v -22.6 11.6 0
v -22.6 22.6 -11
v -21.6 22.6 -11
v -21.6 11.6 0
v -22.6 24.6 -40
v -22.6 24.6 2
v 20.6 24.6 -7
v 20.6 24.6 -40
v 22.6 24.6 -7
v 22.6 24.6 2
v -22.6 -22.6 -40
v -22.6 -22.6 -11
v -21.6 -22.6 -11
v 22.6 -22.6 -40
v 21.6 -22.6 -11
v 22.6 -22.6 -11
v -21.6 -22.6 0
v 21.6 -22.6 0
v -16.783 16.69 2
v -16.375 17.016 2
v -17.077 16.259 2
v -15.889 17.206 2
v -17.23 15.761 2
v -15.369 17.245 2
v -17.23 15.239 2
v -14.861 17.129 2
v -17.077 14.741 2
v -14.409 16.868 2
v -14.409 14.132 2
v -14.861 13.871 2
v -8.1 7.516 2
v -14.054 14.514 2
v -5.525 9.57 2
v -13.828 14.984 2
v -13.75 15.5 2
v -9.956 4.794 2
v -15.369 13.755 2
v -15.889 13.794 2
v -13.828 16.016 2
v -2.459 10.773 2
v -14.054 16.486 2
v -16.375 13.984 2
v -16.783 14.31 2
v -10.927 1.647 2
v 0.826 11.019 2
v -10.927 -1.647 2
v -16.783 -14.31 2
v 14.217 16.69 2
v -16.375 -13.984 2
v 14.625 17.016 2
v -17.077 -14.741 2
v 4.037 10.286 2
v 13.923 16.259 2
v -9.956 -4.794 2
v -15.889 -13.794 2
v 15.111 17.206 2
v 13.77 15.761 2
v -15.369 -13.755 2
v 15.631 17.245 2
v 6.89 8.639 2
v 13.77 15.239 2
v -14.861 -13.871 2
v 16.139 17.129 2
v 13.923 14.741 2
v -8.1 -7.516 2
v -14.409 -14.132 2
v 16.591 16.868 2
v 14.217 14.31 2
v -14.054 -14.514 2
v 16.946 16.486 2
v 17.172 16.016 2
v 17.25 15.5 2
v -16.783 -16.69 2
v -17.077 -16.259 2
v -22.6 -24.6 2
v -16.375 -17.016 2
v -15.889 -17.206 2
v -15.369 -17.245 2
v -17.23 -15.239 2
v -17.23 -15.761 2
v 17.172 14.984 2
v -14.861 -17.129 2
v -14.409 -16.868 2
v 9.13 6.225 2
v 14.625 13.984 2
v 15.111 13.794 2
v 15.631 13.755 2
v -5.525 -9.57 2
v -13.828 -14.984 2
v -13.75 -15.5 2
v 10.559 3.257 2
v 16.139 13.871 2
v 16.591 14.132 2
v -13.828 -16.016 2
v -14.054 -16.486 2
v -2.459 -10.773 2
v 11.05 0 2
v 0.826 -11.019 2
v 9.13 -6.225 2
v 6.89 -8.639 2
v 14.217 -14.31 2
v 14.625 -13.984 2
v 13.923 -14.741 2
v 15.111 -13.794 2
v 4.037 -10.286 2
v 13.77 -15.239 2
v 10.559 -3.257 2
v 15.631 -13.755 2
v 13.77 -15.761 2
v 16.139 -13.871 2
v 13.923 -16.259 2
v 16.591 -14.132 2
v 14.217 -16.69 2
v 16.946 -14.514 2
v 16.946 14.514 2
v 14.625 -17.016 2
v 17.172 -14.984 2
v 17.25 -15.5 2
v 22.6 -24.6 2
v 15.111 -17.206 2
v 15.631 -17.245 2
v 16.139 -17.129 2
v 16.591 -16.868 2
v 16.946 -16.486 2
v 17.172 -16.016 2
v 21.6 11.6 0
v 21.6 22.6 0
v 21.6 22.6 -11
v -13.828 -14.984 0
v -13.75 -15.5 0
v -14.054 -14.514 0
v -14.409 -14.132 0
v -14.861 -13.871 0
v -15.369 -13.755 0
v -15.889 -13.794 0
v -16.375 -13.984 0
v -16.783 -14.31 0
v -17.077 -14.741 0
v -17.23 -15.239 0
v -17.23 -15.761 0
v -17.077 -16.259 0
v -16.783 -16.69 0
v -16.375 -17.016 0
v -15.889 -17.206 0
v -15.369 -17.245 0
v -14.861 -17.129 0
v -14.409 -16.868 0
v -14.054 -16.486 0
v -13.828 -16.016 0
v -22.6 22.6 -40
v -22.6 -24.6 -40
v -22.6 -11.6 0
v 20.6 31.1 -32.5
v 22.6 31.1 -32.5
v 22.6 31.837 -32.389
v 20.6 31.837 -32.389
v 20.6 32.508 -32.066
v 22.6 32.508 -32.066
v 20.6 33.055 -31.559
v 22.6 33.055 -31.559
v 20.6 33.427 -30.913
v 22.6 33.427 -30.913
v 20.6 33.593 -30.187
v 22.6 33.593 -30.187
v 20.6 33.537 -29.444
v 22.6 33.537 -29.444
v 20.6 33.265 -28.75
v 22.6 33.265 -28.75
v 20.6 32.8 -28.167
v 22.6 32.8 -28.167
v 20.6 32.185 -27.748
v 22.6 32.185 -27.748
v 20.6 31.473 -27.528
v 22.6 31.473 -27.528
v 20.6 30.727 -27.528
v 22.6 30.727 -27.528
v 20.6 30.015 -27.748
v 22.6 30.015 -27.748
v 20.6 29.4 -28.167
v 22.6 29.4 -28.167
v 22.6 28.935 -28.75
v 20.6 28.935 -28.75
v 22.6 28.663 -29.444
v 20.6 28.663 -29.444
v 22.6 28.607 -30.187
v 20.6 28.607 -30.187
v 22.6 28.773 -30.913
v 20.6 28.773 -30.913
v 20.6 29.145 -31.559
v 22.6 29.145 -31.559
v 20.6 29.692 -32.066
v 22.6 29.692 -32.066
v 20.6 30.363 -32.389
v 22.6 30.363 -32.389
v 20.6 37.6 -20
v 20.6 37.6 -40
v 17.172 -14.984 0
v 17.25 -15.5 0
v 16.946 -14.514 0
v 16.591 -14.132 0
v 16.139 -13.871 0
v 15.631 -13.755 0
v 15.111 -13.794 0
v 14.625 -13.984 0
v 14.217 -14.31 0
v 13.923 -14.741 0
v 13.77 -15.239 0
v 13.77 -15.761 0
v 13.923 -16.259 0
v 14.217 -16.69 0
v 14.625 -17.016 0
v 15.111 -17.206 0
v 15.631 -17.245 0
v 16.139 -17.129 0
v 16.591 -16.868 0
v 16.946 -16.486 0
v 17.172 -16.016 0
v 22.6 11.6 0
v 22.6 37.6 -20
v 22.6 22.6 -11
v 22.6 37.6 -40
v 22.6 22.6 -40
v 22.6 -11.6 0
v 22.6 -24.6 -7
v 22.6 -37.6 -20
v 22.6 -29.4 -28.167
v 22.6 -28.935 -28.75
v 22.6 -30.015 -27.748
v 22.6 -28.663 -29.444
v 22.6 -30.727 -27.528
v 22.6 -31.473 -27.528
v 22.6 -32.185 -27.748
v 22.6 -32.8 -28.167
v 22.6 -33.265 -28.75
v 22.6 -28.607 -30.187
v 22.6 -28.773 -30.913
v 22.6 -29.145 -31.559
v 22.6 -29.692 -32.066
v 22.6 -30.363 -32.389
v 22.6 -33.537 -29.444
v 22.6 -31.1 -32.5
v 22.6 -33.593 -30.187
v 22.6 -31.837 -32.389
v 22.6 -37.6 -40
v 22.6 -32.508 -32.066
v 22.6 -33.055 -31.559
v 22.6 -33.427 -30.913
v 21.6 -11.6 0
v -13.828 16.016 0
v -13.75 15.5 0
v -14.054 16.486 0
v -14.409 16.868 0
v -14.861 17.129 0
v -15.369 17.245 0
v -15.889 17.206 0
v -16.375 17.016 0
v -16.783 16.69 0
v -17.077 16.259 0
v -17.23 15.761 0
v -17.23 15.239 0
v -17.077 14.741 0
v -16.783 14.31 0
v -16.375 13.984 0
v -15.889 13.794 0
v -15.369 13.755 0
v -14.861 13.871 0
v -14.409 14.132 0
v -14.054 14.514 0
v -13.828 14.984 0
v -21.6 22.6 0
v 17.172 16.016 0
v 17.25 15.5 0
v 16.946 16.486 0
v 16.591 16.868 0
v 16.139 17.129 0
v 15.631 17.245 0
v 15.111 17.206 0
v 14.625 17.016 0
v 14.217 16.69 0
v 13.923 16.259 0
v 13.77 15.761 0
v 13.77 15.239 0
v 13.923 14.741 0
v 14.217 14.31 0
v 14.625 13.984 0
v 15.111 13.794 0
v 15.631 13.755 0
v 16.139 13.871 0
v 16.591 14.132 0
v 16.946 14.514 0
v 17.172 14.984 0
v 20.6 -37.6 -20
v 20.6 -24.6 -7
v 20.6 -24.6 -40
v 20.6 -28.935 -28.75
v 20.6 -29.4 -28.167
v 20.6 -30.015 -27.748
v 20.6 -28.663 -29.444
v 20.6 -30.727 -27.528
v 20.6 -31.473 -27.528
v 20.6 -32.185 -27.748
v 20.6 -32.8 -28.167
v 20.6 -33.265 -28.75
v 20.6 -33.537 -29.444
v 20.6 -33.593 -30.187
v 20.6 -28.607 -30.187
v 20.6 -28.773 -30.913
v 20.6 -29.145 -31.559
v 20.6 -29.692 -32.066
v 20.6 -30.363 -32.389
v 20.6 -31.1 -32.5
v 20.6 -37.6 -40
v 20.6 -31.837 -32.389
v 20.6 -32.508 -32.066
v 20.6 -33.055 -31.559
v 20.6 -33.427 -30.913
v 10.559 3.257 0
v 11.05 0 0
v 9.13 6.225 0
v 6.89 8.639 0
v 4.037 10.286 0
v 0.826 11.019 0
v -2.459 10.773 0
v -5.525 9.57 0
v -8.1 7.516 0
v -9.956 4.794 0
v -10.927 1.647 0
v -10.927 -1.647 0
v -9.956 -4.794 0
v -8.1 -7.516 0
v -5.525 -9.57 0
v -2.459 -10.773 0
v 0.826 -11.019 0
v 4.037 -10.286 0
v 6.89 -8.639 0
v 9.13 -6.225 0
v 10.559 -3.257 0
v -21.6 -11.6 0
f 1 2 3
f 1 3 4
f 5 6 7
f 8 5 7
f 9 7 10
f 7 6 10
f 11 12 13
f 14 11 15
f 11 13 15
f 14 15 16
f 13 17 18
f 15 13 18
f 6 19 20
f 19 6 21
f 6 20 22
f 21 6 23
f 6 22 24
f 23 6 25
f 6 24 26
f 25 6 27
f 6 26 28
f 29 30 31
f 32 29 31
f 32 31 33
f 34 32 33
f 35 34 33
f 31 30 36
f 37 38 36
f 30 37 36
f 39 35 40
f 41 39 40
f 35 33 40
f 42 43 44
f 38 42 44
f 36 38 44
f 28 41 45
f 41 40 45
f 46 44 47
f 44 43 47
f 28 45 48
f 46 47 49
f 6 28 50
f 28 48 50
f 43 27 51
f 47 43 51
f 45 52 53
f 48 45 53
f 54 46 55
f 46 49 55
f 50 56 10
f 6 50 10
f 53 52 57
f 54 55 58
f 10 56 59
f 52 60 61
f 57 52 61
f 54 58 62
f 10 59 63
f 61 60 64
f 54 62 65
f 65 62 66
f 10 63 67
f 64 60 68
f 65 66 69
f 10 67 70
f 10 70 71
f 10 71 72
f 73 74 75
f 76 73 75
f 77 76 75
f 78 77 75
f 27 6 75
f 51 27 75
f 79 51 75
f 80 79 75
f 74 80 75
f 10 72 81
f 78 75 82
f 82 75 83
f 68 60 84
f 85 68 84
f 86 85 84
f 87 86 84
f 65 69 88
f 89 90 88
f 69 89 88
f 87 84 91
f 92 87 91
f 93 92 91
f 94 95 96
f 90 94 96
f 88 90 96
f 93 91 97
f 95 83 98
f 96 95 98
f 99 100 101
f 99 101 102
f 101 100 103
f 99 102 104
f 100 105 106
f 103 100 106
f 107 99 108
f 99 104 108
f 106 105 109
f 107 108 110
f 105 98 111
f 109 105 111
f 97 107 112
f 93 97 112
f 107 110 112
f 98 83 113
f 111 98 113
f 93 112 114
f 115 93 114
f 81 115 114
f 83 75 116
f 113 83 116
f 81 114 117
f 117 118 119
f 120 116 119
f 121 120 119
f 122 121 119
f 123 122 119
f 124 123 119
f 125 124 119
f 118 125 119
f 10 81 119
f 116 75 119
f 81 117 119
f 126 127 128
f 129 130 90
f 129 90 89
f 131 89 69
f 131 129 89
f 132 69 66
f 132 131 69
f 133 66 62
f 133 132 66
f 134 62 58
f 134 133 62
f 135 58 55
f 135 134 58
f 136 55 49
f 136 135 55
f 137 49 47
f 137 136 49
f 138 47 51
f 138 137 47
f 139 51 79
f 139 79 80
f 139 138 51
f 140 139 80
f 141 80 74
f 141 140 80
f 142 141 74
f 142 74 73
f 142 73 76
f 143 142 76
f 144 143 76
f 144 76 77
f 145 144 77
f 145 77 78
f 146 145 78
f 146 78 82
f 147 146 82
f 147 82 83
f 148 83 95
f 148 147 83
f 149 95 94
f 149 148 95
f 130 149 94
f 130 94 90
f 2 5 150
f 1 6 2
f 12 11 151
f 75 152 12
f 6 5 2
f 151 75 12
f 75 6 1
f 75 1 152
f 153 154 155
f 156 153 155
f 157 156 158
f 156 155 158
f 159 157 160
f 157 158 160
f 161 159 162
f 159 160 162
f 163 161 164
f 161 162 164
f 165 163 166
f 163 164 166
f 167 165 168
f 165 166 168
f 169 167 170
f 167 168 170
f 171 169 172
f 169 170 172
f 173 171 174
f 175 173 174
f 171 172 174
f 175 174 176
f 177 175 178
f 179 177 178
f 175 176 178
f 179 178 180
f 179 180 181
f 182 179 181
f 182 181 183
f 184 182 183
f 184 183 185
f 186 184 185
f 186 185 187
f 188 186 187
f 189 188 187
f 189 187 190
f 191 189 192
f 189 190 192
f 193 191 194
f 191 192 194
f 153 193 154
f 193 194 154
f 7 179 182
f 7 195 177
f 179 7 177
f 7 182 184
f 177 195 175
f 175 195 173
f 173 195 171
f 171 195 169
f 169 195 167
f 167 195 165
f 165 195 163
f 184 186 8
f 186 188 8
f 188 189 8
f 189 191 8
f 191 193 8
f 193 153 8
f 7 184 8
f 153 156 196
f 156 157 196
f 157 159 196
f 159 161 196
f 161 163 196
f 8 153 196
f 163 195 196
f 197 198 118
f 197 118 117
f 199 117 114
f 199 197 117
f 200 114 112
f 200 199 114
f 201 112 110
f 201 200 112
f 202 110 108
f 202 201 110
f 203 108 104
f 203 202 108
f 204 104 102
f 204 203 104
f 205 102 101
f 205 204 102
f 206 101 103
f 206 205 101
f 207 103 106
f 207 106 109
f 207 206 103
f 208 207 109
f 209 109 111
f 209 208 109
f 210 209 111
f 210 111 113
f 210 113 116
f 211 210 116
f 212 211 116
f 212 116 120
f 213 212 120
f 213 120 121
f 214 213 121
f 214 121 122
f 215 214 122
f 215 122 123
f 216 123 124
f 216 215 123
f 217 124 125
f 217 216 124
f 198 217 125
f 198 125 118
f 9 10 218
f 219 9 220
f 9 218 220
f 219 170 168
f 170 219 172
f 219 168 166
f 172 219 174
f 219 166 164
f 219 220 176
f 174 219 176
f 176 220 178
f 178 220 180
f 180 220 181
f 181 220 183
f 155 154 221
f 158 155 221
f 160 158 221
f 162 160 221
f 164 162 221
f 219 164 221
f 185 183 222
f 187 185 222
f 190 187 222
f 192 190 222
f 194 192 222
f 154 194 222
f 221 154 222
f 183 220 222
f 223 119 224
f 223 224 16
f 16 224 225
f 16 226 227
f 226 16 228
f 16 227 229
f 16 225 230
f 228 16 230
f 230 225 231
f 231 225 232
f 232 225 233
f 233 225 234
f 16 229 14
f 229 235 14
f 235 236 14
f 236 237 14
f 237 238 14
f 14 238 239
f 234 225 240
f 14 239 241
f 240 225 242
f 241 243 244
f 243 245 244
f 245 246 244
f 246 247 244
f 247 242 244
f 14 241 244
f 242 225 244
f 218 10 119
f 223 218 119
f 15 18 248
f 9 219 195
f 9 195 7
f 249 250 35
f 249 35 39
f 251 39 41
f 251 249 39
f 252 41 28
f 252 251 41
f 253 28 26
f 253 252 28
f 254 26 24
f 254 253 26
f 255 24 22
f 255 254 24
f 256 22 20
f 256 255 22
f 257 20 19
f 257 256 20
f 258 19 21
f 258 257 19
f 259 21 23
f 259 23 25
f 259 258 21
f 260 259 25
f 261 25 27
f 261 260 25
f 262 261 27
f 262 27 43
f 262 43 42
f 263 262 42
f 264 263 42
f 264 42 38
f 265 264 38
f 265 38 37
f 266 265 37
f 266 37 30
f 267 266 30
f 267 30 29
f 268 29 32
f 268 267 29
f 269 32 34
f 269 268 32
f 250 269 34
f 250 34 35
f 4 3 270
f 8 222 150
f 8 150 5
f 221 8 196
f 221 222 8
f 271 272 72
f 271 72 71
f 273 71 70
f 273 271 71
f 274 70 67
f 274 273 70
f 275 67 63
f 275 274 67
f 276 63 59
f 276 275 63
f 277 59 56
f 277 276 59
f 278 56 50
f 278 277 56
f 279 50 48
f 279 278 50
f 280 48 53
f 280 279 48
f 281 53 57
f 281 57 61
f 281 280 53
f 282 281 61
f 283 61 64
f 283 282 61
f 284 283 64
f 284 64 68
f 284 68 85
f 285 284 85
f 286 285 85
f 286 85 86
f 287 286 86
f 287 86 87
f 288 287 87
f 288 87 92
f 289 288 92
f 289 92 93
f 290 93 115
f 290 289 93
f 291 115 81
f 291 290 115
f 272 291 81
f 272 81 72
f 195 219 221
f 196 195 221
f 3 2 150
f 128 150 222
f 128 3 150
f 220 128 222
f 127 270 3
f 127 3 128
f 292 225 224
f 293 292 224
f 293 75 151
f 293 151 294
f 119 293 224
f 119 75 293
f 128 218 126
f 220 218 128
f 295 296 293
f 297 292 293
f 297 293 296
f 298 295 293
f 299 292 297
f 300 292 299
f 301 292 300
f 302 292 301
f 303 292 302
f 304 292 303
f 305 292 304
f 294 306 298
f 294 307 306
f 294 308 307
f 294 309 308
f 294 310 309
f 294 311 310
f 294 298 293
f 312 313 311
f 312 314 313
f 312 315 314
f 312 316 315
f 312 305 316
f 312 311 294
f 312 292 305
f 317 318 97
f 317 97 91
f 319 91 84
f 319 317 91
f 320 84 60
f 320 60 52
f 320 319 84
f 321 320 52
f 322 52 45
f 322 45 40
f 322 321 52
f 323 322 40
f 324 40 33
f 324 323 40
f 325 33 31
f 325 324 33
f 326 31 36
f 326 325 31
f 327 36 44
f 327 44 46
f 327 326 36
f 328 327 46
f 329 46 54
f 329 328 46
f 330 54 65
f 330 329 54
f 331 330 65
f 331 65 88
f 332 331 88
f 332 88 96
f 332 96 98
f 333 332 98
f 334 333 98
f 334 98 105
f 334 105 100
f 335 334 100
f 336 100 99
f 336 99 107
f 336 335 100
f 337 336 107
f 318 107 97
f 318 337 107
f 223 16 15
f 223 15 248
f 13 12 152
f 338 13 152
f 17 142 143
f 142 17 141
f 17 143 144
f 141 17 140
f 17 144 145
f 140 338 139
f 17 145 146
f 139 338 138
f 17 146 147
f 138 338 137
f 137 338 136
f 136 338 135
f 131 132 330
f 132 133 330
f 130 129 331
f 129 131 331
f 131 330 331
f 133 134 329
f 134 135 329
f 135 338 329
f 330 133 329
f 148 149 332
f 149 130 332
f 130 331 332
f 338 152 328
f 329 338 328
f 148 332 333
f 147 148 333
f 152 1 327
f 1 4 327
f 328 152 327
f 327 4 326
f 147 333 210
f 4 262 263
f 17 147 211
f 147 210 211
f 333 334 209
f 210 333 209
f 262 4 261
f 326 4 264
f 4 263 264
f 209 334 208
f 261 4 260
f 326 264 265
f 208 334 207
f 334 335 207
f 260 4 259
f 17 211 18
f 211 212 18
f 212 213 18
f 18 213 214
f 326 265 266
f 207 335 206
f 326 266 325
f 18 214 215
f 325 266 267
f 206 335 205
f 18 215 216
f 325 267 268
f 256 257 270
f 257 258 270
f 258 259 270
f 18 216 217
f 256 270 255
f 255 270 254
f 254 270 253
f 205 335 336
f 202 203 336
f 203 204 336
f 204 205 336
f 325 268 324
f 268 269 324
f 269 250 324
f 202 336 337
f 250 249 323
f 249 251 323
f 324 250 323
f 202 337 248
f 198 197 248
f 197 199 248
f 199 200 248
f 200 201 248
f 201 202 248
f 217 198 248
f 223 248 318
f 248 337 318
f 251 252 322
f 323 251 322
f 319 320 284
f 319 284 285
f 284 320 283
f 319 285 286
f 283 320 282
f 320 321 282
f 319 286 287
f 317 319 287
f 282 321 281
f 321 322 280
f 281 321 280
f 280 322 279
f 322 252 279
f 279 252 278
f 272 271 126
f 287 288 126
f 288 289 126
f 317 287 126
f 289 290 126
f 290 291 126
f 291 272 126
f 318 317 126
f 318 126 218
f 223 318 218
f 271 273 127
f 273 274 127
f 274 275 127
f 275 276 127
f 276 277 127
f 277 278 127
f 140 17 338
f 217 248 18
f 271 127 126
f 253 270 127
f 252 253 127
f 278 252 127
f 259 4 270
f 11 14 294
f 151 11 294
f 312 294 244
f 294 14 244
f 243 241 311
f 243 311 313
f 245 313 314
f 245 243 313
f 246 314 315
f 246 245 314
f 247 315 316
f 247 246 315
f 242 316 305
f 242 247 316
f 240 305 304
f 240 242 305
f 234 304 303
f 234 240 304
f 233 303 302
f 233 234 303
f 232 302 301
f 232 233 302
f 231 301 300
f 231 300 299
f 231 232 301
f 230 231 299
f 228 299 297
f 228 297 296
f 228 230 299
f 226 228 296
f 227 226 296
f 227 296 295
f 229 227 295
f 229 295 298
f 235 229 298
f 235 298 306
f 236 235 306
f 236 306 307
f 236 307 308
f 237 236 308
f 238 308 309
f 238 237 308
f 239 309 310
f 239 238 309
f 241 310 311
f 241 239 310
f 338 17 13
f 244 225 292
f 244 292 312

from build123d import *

# Parameters (mm, degrees)
SKETCH1_W           = 45.2
SKETCH1_H           = 45.2
SKETCH1_R           = 1.75
SKETCH1_R_2         = 11.05
BOSS_EXTRUDE1_DEPTH = 2
SKETCH3_W           = 45.2
SKETCH3_H           = 2
BOSS_EXTRUDE2_DEPTH = 42
SKETCH4_W           = 20
SKETCH4_H           = 13
SKETCH4_R           = 2.5
BOSS_EXTRUDE3_DEPTH = 2
BOSS_EXTRUDE4_DEPTH = 1
BOSS_EXTRUDE5_DEPTH = 1


with BuildPart() as part:
    # Sketch1 → Boss-Extrude1 (new body)
    with BuildSketch(Plane.XY):
        Rectangle(SKETCH1_W, SKETCH1_H)
        with Locations((-15.5, 15.5)):
            Circle(SKETCH1_R, mode=Mode.SUBTRACT)
        with Locations((15.5, 15.5)):
            Circle(SKETCH1_R, mode=Mode.SUBTRACT)
        with Locations((-15.5, -15.5)):
            Circle(SKETCH1_R, mode=Mode.SUBTRACT)
        with Locations((15.5, -15.5)):
            Circle(SKETCH1_R, mode=Mode.SUBTRACT)
        Circle(SKETCH1_R_2, mode=Mode.SUBTRACT)
    extrude(amount=BOSS_EXTRUDE1_DEPTH)

    # Sketch3 → Boss-Extrude2 (add)
    with BuildSketch(Plane.XY.offset(2)):
        with Locations((0, 23.6)):
            Rectangle(SKETCH3_W, SKETCH3_H)
    boss_extrude2 = extrude(amount=-BOSS_EXTRUDE2_DEPTH)

    # Sketch4 → Boss-Extrude3 (add)
    with BuildSketch(Plane(origin=(22.6, 0, 0), x_dir=(0, 0, -1), z_dir=(1, 0, 0))):
        Polygon((7, 24.6), (20, 24.6), (20, 37.6), align=None)
        with Locations((30, 31.1)):
            Rectangle(SKETCH4_W, SKETCH4_H)
        with Locations((30, 31.1)):
            Circle(SKETCH4_R, mode=Mode.SUBTRACT)
    boss_extrude3 = extrude(amount=-BOSS_EXTRUDE3_DEPTH)

    # Mirror1: Boss-Extrude2, Boss-Extrude3 across plane
    add(boss_extrude2.mirror(Plane.ZX))
    add(boss_extrude3.mirror(Plane.ZX))

    # Sketch5 → Boss-Extrude4 (add)
    with BuildSketch(Plane.ZY.offset(22.6)):
        Polygon((-13, 24.6), (2, 9.6), (2, 24.6), align=None)
        Polygon((-13, -24.6), (2, -9.6), (2, -24.6), align=None)
    extrude(amount=-BOSS_EXTRUDE4_DEPTH)

    # Sketch6 → Boss-Extrude5 (add)
    with BuildSketch(Plane(origin=(22.6, 0, 0), x_dir=(0, 0, -1), z_dir=(1, 0, 0))):
        Polygon((-2, 9.6), (13, 24.6), (-2, 24.6), align=None)
        Polygon((13, -24.6), (-2, -9.6), (-2, -24.6), align=None)
    extrude(amount=-BOSS_EXTRUDE5_DEPTH)


solid = part.part
